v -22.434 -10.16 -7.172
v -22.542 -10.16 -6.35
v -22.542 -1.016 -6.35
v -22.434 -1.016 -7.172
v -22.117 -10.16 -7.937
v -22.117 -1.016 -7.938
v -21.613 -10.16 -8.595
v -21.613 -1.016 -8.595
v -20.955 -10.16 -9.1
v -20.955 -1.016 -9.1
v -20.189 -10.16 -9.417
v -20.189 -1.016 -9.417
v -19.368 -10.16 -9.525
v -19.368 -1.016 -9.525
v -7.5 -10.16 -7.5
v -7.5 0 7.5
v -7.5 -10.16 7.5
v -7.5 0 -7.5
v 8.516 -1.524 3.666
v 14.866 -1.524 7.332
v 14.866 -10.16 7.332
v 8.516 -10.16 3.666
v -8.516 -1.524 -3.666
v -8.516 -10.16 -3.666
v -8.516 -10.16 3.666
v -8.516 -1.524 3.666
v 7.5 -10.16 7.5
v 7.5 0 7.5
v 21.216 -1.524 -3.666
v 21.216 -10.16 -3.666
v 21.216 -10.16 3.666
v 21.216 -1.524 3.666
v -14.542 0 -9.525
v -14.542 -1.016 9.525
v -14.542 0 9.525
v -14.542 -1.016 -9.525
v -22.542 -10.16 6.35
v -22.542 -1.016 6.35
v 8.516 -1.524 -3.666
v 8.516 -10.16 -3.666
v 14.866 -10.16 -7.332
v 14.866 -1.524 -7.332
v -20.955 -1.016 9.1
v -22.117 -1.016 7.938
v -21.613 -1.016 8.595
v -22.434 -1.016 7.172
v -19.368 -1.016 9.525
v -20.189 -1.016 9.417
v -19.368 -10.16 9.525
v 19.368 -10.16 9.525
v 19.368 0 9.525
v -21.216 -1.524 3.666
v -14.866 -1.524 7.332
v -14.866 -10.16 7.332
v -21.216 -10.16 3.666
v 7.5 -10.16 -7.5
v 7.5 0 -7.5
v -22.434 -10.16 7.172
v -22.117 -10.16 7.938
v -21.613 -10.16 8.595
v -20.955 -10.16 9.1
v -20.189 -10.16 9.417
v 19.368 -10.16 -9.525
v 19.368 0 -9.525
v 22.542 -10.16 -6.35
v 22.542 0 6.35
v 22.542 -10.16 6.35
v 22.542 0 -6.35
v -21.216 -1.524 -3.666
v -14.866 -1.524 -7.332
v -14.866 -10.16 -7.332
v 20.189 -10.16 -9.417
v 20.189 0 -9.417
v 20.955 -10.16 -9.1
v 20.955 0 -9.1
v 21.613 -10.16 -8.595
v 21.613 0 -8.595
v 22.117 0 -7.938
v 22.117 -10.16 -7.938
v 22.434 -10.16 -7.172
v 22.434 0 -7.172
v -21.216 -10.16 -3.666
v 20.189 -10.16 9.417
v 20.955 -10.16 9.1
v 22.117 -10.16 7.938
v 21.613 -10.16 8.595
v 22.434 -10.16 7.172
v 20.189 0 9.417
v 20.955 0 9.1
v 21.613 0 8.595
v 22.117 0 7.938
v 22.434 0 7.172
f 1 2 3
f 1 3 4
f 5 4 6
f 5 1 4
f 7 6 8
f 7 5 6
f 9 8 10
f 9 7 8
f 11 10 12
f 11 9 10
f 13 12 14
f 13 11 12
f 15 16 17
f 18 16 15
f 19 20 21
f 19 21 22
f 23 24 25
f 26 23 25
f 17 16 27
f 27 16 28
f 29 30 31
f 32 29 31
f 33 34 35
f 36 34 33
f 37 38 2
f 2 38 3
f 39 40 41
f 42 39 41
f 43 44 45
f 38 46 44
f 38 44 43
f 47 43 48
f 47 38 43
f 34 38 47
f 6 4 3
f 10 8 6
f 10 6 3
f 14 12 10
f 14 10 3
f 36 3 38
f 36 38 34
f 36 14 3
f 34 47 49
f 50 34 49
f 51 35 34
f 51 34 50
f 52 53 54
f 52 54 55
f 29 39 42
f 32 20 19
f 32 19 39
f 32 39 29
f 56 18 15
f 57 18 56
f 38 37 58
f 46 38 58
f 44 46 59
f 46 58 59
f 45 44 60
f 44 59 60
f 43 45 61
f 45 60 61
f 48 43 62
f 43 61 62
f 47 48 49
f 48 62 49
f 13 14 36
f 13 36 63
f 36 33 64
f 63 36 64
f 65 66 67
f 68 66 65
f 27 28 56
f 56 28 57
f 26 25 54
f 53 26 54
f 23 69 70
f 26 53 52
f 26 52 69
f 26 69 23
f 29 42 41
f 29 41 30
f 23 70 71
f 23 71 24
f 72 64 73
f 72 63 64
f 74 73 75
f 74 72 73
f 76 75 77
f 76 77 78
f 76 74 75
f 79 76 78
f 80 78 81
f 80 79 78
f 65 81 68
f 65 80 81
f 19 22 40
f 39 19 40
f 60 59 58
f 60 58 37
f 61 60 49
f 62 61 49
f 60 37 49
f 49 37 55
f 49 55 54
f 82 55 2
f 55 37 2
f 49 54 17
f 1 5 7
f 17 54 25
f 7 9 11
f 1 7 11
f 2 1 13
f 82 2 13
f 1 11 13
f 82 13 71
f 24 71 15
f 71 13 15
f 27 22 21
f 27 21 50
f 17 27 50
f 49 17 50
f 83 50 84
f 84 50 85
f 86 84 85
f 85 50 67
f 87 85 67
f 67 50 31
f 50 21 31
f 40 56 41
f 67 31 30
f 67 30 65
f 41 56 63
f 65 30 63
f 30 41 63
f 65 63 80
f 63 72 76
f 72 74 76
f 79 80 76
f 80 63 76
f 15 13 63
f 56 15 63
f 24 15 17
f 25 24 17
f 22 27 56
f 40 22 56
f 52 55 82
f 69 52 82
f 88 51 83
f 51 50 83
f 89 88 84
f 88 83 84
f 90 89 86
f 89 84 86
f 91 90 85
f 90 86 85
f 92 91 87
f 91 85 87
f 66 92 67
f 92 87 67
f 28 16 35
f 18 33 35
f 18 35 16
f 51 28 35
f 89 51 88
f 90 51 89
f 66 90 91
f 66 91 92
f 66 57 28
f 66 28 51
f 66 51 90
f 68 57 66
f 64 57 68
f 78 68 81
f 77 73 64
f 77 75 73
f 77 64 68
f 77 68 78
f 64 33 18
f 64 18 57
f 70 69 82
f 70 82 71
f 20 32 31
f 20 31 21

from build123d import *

# Parameters (mm, degrees)
SKETCH1_W               = 45.085
SKETCH1_H               = 19.05
BOSS_EXTRUDE1_DEPTH     = 10.16
SKETCH2_W               = 15
SKETCH2_H               = 15
CUT_EXTRUDE1_DEPTH      = 27.497462732
FILLET1_R               = 3.175
CUT_EXTRUDE2_DEPTH      = 27.497462732
CUT_EXTRUDE2_DEPTH_BACK = 1.016
CUT_EXTRUDE3_DEPTH      = 8.636


with BuildPart() as part:
    # Sketch1 → Boss-Extrude1 (new body)
    with BuildSketch(Plane(origin=(0, 0, 0), x_dir=(1, 0, 0), z_dir=(0, 1, 0))):
        Rectangle(SKETCH1_W, SKETCH1_H)
    extrude(amount=-BOSS_EXTRUDE1_DEPTH)

    # Sketch2 → Cut-Extrude1 (cut, through all)
    with BuildSketch(Plane(origin=(0, 0, 0), x_dir=(1, 0, 0), z_dir=(0, 1, 0))):
        Rectangle(SKETCH2_W, SKETCH2_H)
    extrude(amount=-CUT_EXTRUDE1_DEPTH, mode=Mode.SUBTRACT)

    # Fillet1
    fillet1_edges = [part.edges().sort_by_distance(p)[0] for p in [
        (22.5425, -5.08, 9.525),
        (-22.5425, -5.08, 9.525),
        (-22.5425, -5.08, -9.525),
        (22.5425, -5.08, -9.525),
    ]]
    fillet(fillet1_edges, radius=FILLET1_R)

    # Sketch3 → Cut-Extrude2 (cut, two sides: drawn at the far end of the back side and taken through both)
    with BuildSketch(Plane(origin=(0, 0, 0), x_dir=(1, 0, 0), z_dir=(0, 1, 0)).offset(-CUT_EXTRUDE2_DEPTH_BACK)):
        Polygon((-14.5425, -102.908445), (-14.5425, -9.525), (-14.5425, 9.525), (-14.5425, 102.908445), (-201.309389999, 102.908445), (-201.309389999, -102.908445), align=None)
    extrude(amount=CUT_EXTRUDE2_DEPTH + CUT_EXTRUDE2_DEPTH_BACK, mode=Mode.SUBTRACT)

    # Sketch5 → Cut-Extrude3 (cut)
    with BuildSketch(Plane.XZ.offset(10.16)):
        Polygon((-21.216, -3.666174209), (-14.866, -7.332348419), (-8.516, -3.666174209), (-8.516, 3.666174209), (-14.866, 7.332348419), (-21.216, 3.666174209), align=None)
        Polygon((8.516, -3.666174209), (14.866, -7.332348419), (21.216, -3.666174209), (21.216, 3.666174209), (14.866, 7.332348419), (8.516, 3.666174209), align=None)
    extrude(amount=-CUT_EXTRUDE3_DEPTH, mode=Mode.SUBTRACT)


solid = part.part
